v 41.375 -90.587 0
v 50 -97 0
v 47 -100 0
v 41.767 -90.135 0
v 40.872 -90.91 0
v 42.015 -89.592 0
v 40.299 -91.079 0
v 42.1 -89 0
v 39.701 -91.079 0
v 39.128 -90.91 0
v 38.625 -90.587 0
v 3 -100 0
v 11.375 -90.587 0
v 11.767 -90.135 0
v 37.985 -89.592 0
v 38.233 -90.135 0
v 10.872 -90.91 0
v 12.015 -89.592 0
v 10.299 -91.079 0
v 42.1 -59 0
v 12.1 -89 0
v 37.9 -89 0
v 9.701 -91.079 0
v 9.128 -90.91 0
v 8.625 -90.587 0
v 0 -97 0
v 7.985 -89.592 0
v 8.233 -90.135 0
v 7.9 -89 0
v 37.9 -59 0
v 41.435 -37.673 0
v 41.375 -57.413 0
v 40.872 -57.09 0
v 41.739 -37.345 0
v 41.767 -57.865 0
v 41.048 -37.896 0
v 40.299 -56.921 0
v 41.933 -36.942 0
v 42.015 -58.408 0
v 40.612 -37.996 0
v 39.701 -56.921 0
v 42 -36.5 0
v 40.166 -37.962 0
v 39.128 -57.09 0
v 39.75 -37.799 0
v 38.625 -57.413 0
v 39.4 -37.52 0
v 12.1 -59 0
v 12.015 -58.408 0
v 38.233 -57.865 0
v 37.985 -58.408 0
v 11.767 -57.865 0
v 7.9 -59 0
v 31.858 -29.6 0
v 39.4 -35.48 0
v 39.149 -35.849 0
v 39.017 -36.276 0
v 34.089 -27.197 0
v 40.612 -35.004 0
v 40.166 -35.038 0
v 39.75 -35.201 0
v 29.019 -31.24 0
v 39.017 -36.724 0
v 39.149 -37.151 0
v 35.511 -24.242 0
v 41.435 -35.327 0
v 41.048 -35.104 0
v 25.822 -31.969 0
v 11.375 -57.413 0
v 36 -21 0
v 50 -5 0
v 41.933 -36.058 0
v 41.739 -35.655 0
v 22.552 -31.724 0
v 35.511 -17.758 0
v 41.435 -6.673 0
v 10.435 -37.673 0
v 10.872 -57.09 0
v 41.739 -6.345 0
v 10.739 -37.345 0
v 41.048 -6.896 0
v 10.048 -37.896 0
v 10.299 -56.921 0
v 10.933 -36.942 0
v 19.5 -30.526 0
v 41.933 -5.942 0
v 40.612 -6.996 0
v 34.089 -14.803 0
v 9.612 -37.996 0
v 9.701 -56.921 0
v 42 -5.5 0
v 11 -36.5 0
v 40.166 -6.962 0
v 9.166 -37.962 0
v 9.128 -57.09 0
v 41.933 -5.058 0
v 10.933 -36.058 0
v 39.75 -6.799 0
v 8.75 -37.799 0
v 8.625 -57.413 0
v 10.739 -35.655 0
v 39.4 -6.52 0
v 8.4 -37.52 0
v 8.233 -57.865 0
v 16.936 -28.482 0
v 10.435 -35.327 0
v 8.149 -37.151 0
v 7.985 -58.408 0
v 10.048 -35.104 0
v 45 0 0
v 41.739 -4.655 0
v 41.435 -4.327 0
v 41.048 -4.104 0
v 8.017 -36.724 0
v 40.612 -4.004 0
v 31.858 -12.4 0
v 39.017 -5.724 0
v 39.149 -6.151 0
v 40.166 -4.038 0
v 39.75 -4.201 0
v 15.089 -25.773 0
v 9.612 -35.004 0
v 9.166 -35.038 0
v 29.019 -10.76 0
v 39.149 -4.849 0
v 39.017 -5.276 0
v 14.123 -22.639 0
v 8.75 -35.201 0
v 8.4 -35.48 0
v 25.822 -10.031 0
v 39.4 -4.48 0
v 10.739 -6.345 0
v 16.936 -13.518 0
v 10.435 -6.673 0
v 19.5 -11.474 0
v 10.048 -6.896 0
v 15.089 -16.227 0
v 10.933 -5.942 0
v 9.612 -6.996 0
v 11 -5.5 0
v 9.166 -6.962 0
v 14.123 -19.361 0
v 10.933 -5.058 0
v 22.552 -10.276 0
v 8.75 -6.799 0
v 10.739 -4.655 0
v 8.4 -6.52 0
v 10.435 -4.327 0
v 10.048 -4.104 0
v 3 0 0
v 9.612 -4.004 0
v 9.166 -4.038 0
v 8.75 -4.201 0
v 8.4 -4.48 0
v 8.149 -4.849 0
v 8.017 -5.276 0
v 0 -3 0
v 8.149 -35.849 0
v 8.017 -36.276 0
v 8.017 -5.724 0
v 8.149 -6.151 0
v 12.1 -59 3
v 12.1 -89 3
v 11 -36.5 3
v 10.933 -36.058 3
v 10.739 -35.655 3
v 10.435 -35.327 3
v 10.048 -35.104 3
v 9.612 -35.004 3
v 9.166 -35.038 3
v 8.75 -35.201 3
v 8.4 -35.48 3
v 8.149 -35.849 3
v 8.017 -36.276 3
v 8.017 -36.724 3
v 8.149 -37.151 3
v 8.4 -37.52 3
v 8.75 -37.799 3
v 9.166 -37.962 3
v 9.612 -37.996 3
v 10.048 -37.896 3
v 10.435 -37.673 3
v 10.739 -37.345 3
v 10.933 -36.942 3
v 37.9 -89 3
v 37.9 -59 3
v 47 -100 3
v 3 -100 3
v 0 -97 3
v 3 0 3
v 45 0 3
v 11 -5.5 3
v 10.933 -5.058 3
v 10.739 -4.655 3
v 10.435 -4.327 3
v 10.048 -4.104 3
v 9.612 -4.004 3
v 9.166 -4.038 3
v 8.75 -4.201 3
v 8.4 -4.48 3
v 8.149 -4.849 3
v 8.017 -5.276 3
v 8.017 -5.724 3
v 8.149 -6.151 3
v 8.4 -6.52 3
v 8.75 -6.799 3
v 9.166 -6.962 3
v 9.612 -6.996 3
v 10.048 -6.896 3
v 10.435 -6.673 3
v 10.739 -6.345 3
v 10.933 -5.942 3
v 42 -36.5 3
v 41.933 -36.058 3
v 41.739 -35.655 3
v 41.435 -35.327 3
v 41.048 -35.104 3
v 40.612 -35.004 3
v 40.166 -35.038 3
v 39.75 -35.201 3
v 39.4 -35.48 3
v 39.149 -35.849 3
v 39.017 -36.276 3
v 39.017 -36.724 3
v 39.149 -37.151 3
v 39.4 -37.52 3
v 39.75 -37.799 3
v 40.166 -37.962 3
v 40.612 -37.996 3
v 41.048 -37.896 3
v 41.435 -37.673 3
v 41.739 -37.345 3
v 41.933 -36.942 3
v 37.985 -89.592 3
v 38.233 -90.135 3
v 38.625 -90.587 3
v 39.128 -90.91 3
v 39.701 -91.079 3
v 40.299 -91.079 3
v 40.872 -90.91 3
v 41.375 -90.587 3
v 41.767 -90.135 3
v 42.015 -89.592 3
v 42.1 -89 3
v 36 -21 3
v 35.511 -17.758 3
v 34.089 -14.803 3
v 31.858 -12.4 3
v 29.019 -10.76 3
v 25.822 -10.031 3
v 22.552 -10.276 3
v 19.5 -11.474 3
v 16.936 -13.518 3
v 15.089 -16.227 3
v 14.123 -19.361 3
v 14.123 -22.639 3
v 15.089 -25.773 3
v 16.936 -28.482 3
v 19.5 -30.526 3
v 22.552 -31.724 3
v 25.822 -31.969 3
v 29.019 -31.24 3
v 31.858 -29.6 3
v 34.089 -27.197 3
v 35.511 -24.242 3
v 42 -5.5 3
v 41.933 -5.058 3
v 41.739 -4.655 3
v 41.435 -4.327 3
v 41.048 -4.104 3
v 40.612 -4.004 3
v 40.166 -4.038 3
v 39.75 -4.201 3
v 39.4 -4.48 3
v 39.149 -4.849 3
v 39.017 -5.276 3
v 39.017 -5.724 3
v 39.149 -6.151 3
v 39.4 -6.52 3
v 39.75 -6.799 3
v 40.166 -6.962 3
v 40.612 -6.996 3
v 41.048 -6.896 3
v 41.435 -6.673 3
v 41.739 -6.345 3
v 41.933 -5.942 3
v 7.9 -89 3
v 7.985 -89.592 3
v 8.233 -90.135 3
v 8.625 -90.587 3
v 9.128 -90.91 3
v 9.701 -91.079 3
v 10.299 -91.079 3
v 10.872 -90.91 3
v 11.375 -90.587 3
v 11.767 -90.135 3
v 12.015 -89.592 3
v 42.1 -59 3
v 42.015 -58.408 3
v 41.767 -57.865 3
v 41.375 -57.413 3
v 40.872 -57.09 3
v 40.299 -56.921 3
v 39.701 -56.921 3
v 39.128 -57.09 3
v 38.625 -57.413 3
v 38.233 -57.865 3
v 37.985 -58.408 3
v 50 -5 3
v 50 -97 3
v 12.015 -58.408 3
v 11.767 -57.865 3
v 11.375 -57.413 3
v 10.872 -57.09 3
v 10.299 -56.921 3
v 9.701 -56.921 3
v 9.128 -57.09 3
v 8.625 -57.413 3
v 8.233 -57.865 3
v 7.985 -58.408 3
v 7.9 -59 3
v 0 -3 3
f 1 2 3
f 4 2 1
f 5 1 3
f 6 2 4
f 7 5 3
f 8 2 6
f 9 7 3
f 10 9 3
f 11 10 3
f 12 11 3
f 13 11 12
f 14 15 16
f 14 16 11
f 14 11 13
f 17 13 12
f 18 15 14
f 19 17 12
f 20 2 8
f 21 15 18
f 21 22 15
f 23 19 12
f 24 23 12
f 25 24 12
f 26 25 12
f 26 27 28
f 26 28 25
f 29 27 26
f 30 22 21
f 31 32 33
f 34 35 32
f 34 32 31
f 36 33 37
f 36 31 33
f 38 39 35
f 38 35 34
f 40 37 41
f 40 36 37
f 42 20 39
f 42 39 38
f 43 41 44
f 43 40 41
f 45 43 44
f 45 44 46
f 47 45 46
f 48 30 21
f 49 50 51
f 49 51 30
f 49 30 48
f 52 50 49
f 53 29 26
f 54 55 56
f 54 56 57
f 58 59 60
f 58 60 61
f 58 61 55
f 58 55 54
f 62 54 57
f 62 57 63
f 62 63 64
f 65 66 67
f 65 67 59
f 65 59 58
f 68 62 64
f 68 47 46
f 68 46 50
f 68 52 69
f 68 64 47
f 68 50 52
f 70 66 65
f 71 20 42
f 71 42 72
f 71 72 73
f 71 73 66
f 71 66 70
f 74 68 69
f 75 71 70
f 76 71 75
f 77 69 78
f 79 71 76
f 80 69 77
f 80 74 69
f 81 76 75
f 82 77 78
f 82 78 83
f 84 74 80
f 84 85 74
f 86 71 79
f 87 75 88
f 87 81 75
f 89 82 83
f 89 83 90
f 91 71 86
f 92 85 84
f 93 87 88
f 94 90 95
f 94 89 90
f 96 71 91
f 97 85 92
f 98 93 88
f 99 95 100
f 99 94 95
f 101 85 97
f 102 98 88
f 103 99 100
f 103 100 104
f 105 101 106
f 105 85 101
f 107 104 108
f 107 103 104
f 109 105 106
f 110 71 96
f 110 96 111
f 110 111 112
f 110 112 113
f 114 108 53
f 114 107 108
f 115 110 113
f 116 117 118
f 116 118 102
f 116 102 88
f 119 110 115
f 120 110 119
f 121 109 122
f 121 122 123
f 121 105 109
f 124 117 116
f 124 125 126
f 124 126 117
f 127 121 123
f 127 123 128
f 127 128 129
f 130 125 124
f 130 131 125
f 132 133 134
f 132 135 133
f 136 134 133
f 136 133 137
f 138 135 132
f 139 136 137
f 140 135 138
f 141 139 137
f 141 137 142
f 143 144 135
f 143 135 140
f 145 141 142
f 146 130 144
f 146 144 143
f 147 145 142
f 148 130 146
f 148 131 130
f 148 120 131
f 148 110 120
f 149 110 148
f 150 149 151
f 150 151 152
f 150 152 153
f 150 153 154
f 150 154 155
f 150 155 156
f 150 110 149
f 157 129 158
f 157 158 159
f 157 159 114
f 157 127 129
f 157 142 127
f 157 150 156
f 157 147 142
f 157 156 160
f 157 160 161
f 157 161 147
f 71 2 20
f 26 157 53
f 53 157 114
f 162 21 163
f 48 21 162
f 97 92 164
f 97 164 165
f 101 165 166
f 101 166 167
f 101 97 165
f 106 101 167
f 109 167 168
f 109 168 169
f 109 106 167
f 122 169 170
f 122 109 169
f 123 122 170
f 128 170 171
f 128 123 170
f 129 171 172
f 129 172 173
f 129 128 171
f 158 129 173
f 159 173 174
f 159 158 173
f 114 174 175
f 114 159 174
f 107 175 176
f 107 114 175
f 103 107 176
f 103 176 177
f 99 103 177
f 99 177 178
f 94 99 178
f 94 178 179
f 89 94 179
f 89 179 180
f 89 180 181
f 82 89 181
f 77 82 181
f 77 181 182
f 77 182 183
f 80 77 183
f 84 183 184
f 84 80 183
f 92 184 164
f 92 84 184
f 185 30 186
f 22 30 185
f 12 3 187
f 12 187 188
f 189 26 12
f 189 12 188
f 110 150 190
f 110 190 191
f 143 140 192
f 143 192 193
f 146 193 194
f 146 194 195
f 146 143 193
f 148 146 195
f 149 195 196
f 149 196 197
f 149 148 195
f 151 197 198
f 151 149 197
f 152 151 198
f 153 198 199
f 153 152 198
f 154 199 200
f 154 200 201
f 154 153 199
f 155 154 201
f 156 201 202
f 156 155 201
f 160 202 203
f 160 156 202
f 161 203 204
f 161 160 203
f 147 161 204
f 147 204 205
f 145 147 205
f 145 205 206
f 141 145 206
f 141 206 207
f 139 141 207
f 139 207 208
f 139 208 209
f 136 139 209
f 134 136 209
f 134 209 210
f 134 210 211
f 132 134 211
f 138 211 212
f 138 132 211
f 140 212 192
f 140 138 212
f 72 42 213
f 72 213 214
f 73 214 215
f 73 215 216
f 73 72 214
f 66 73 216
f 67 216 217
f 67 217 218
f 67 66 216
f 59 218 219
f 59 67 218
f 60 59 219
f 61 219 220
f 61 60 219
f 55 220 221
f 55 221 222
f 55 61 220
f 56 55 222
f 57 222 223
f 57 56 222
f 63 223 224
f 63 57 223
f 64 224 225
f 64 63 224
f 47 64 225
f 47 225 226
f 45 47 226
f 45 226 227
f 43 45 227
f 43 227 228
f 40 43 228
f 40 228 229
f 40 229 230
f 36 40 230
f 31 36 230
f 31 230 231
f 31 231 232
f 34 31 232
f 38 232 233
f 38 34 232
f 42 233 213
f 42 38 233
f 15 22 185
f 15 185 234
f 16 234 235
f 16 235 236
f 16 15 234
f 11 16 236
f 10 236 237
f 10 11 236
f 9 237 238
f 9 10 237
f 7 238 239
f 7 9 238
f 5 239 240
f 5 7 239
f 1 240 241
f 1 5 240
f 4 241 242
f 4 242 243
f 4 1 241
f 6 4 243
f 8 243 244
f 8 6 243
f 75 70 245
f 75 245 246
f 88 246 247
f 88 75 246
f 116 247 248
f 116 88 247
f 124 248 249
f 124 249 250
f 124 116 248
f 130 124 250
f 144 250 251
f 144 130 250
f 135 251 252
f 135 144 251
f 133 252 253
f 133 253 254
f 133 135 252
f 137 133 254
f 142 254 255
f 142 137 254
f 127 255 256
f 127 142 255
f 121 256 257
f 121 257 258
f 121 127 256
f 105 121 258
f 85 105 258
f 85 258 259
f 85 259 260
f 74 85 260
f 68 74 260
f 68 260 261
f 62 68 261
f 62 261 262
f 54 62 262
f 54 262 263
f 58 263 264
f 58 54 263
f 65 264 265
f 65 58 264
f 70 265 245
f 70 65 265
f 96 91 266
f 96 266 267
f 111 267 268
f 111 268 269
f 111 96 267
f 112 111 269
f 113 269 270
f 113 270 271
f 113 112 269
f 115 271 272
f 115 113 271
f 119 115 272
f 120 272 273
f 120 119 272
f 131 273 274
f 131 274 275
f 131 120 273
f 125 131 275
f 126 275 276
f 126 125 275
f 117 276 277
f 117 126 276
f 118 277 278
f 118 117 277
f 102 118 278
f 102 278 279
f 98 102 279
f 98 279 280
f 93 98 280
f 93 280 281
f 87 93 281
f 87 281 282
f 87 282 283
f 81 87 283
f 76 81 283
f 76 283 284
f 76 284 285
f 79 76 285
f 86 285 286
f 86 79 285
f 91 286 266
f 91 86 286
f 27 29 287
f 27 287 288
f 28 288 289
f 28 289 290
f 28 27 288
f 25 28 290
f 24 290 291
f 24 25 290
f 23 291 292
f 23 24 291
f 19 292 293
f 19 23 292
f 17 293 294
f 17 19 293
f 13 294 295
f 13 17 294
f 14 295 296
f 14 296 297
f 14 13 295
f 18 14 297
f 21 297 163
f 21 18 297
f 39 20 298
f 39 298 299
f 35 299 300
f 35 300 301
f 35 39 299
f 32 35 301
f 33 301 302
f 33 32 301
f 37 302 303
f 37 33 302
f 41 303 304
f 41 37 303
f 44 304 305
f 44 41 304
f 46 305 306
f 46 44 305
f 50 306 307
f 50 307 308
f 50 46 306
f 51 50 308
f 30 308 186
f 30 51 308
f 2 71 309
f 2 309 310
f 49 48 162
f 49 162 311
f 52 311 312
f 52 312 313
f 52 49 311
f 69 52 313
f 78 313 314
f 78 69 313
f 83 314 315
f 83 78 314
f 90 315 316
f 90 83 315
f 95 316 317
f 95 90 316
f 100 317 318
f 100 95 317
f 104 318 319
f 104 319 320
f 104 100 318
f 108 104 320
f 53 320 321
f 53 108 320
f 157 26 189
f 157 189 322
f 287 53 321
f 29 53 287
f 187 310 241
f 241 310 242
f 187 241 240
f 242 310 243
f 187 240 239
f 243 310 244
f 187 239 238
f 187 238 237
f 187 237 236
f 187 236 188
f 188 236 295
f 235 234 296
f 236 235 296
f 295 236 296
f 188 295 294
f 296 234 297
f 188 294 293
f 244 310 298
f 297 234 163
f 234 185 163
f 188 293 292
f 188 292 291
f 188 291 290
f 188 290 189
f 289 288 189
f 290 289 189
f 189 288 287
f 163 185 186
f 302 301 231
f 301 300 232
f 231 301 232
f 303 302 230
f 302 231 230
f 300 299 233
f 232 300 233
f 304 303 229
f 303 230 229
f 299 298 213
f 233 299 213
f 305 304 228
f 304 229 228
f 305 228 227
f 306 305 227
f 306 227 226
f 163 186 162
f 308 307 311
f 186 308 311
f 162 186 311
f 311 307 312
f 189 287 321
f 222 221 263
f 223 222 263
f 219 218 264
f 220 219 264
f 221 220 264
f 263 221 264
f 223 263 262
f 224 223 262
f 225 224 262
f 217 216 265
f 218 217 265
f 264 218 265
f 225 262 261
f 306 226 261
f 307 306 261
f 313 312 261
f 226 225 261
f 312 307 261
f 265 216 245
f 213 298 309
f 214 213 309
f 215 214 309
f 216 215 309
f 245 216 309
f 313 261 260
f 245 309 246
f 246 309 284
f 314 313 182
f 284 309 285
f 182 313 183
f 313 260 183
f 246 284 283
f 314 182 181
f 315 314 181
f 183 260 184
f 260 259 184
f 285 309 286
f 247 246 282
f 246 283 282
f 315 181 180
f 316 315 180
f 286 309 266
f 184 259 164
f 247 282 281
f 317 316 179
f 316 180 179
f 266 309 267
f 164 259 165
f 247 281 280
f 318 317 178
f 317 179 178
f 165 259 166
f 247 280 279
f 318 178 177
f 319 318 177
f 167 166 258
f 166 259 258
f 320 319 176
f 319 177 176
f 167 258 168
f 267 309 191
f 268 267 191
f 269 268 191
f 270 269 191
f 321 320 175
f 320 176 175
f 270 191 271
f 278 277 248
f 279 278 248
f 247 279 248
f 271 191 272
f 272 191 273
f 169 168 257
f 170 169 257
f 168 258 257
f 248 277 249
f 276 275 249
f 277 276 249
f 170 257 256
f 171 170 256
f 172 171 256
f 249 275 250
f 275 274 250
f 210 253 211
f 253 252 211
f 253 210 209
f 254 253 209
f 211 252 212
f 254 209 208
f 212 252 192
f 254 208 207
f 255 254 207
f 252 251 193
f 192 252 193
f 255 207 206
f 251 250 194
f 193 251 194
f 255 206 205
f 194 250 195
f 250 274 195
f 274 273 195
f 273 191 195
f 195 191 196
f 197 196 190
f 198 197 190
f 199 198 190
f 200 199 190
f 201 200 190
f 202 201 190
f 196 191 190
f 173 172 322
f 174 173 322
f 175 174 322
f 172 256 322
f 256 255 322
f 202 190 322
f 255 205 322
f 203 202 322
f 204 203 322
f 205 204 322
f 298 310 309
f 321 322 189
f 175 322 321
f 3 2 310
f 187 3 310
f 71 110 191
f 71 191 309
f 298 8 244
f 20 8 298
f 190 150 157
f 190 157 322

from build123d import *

# Parameters (mm, degrees)
SKETCH_1_R      = 1.5
SKETCH_1_R_2    = 11
EXTRUDE_1_DEPTH = 3
CHAMFER_1_SIZE  = 3


with BuildPart() as part:
    # 草图1 → 凸台-拉伸1 (new body)
    with BuildSketch(Plane.XY):
        Polygon((45, 0), (50, -5), (50, -100), (0, -100), (0, 0), align=None)
        with Locations((9.5, -36.5)):
            Circle(SKETCH_1_R, mode=Mode.SUBTRACT)
        with Locations((9.5, -5.5)):
            Circle(SKETCH_1_R, mode=Mode.SUBTRACT)
        with Locations((25, -21)):
            Circle(SKETCH_1_R_2, mode=Mode.SUBTRACT)
        with Locations((40.5, -36.5)):
            Circle(SKETCH_1_R, mode=Mode.SUBTRACT)
        with Locations((40.5, -5.5)):
            Circle(SKETCH_1_R, mode=Mode.SUBTRACT)
        with BuildLine():
            ThreePointArc((42.1, -59), (40, -56.9), (37.9, -59))
            Line((37.9, -59), (37.9, -89))
            ThreePointArc((37.9, -89), (40, -91.1), (42.1, -89))
            Line((42.1, -89), (42.1, -59))
        make_face(mode=Mode.SUBTRACT)
        with BuildLine():
            ThreePointArc((7.9, -89), (10, -91.1), (12.1, -89))
            Line((12.1, -89), (12.1, -59))
            ThreePointArc((12.1, -59), (10, -56.9), (7.9, -59))
            Line((7.9, -59), (7.9, -89))
        make_face(mode=Mode.SUBTRACT)
    extrude(amount=EXTRUDE_1_DEPTH)

    # 倒角1
    chamfer_1_edges = [part.edges().sort_by_distance(p)[0] for p in [
        (50, -100, 1.5),
        (0, -100, 1.5),
        (0, 0, 1.5),
    ]]
    chamfer(chamfer_1_edges, length=CHAMFER_1_SIZE)


solid = part.part
